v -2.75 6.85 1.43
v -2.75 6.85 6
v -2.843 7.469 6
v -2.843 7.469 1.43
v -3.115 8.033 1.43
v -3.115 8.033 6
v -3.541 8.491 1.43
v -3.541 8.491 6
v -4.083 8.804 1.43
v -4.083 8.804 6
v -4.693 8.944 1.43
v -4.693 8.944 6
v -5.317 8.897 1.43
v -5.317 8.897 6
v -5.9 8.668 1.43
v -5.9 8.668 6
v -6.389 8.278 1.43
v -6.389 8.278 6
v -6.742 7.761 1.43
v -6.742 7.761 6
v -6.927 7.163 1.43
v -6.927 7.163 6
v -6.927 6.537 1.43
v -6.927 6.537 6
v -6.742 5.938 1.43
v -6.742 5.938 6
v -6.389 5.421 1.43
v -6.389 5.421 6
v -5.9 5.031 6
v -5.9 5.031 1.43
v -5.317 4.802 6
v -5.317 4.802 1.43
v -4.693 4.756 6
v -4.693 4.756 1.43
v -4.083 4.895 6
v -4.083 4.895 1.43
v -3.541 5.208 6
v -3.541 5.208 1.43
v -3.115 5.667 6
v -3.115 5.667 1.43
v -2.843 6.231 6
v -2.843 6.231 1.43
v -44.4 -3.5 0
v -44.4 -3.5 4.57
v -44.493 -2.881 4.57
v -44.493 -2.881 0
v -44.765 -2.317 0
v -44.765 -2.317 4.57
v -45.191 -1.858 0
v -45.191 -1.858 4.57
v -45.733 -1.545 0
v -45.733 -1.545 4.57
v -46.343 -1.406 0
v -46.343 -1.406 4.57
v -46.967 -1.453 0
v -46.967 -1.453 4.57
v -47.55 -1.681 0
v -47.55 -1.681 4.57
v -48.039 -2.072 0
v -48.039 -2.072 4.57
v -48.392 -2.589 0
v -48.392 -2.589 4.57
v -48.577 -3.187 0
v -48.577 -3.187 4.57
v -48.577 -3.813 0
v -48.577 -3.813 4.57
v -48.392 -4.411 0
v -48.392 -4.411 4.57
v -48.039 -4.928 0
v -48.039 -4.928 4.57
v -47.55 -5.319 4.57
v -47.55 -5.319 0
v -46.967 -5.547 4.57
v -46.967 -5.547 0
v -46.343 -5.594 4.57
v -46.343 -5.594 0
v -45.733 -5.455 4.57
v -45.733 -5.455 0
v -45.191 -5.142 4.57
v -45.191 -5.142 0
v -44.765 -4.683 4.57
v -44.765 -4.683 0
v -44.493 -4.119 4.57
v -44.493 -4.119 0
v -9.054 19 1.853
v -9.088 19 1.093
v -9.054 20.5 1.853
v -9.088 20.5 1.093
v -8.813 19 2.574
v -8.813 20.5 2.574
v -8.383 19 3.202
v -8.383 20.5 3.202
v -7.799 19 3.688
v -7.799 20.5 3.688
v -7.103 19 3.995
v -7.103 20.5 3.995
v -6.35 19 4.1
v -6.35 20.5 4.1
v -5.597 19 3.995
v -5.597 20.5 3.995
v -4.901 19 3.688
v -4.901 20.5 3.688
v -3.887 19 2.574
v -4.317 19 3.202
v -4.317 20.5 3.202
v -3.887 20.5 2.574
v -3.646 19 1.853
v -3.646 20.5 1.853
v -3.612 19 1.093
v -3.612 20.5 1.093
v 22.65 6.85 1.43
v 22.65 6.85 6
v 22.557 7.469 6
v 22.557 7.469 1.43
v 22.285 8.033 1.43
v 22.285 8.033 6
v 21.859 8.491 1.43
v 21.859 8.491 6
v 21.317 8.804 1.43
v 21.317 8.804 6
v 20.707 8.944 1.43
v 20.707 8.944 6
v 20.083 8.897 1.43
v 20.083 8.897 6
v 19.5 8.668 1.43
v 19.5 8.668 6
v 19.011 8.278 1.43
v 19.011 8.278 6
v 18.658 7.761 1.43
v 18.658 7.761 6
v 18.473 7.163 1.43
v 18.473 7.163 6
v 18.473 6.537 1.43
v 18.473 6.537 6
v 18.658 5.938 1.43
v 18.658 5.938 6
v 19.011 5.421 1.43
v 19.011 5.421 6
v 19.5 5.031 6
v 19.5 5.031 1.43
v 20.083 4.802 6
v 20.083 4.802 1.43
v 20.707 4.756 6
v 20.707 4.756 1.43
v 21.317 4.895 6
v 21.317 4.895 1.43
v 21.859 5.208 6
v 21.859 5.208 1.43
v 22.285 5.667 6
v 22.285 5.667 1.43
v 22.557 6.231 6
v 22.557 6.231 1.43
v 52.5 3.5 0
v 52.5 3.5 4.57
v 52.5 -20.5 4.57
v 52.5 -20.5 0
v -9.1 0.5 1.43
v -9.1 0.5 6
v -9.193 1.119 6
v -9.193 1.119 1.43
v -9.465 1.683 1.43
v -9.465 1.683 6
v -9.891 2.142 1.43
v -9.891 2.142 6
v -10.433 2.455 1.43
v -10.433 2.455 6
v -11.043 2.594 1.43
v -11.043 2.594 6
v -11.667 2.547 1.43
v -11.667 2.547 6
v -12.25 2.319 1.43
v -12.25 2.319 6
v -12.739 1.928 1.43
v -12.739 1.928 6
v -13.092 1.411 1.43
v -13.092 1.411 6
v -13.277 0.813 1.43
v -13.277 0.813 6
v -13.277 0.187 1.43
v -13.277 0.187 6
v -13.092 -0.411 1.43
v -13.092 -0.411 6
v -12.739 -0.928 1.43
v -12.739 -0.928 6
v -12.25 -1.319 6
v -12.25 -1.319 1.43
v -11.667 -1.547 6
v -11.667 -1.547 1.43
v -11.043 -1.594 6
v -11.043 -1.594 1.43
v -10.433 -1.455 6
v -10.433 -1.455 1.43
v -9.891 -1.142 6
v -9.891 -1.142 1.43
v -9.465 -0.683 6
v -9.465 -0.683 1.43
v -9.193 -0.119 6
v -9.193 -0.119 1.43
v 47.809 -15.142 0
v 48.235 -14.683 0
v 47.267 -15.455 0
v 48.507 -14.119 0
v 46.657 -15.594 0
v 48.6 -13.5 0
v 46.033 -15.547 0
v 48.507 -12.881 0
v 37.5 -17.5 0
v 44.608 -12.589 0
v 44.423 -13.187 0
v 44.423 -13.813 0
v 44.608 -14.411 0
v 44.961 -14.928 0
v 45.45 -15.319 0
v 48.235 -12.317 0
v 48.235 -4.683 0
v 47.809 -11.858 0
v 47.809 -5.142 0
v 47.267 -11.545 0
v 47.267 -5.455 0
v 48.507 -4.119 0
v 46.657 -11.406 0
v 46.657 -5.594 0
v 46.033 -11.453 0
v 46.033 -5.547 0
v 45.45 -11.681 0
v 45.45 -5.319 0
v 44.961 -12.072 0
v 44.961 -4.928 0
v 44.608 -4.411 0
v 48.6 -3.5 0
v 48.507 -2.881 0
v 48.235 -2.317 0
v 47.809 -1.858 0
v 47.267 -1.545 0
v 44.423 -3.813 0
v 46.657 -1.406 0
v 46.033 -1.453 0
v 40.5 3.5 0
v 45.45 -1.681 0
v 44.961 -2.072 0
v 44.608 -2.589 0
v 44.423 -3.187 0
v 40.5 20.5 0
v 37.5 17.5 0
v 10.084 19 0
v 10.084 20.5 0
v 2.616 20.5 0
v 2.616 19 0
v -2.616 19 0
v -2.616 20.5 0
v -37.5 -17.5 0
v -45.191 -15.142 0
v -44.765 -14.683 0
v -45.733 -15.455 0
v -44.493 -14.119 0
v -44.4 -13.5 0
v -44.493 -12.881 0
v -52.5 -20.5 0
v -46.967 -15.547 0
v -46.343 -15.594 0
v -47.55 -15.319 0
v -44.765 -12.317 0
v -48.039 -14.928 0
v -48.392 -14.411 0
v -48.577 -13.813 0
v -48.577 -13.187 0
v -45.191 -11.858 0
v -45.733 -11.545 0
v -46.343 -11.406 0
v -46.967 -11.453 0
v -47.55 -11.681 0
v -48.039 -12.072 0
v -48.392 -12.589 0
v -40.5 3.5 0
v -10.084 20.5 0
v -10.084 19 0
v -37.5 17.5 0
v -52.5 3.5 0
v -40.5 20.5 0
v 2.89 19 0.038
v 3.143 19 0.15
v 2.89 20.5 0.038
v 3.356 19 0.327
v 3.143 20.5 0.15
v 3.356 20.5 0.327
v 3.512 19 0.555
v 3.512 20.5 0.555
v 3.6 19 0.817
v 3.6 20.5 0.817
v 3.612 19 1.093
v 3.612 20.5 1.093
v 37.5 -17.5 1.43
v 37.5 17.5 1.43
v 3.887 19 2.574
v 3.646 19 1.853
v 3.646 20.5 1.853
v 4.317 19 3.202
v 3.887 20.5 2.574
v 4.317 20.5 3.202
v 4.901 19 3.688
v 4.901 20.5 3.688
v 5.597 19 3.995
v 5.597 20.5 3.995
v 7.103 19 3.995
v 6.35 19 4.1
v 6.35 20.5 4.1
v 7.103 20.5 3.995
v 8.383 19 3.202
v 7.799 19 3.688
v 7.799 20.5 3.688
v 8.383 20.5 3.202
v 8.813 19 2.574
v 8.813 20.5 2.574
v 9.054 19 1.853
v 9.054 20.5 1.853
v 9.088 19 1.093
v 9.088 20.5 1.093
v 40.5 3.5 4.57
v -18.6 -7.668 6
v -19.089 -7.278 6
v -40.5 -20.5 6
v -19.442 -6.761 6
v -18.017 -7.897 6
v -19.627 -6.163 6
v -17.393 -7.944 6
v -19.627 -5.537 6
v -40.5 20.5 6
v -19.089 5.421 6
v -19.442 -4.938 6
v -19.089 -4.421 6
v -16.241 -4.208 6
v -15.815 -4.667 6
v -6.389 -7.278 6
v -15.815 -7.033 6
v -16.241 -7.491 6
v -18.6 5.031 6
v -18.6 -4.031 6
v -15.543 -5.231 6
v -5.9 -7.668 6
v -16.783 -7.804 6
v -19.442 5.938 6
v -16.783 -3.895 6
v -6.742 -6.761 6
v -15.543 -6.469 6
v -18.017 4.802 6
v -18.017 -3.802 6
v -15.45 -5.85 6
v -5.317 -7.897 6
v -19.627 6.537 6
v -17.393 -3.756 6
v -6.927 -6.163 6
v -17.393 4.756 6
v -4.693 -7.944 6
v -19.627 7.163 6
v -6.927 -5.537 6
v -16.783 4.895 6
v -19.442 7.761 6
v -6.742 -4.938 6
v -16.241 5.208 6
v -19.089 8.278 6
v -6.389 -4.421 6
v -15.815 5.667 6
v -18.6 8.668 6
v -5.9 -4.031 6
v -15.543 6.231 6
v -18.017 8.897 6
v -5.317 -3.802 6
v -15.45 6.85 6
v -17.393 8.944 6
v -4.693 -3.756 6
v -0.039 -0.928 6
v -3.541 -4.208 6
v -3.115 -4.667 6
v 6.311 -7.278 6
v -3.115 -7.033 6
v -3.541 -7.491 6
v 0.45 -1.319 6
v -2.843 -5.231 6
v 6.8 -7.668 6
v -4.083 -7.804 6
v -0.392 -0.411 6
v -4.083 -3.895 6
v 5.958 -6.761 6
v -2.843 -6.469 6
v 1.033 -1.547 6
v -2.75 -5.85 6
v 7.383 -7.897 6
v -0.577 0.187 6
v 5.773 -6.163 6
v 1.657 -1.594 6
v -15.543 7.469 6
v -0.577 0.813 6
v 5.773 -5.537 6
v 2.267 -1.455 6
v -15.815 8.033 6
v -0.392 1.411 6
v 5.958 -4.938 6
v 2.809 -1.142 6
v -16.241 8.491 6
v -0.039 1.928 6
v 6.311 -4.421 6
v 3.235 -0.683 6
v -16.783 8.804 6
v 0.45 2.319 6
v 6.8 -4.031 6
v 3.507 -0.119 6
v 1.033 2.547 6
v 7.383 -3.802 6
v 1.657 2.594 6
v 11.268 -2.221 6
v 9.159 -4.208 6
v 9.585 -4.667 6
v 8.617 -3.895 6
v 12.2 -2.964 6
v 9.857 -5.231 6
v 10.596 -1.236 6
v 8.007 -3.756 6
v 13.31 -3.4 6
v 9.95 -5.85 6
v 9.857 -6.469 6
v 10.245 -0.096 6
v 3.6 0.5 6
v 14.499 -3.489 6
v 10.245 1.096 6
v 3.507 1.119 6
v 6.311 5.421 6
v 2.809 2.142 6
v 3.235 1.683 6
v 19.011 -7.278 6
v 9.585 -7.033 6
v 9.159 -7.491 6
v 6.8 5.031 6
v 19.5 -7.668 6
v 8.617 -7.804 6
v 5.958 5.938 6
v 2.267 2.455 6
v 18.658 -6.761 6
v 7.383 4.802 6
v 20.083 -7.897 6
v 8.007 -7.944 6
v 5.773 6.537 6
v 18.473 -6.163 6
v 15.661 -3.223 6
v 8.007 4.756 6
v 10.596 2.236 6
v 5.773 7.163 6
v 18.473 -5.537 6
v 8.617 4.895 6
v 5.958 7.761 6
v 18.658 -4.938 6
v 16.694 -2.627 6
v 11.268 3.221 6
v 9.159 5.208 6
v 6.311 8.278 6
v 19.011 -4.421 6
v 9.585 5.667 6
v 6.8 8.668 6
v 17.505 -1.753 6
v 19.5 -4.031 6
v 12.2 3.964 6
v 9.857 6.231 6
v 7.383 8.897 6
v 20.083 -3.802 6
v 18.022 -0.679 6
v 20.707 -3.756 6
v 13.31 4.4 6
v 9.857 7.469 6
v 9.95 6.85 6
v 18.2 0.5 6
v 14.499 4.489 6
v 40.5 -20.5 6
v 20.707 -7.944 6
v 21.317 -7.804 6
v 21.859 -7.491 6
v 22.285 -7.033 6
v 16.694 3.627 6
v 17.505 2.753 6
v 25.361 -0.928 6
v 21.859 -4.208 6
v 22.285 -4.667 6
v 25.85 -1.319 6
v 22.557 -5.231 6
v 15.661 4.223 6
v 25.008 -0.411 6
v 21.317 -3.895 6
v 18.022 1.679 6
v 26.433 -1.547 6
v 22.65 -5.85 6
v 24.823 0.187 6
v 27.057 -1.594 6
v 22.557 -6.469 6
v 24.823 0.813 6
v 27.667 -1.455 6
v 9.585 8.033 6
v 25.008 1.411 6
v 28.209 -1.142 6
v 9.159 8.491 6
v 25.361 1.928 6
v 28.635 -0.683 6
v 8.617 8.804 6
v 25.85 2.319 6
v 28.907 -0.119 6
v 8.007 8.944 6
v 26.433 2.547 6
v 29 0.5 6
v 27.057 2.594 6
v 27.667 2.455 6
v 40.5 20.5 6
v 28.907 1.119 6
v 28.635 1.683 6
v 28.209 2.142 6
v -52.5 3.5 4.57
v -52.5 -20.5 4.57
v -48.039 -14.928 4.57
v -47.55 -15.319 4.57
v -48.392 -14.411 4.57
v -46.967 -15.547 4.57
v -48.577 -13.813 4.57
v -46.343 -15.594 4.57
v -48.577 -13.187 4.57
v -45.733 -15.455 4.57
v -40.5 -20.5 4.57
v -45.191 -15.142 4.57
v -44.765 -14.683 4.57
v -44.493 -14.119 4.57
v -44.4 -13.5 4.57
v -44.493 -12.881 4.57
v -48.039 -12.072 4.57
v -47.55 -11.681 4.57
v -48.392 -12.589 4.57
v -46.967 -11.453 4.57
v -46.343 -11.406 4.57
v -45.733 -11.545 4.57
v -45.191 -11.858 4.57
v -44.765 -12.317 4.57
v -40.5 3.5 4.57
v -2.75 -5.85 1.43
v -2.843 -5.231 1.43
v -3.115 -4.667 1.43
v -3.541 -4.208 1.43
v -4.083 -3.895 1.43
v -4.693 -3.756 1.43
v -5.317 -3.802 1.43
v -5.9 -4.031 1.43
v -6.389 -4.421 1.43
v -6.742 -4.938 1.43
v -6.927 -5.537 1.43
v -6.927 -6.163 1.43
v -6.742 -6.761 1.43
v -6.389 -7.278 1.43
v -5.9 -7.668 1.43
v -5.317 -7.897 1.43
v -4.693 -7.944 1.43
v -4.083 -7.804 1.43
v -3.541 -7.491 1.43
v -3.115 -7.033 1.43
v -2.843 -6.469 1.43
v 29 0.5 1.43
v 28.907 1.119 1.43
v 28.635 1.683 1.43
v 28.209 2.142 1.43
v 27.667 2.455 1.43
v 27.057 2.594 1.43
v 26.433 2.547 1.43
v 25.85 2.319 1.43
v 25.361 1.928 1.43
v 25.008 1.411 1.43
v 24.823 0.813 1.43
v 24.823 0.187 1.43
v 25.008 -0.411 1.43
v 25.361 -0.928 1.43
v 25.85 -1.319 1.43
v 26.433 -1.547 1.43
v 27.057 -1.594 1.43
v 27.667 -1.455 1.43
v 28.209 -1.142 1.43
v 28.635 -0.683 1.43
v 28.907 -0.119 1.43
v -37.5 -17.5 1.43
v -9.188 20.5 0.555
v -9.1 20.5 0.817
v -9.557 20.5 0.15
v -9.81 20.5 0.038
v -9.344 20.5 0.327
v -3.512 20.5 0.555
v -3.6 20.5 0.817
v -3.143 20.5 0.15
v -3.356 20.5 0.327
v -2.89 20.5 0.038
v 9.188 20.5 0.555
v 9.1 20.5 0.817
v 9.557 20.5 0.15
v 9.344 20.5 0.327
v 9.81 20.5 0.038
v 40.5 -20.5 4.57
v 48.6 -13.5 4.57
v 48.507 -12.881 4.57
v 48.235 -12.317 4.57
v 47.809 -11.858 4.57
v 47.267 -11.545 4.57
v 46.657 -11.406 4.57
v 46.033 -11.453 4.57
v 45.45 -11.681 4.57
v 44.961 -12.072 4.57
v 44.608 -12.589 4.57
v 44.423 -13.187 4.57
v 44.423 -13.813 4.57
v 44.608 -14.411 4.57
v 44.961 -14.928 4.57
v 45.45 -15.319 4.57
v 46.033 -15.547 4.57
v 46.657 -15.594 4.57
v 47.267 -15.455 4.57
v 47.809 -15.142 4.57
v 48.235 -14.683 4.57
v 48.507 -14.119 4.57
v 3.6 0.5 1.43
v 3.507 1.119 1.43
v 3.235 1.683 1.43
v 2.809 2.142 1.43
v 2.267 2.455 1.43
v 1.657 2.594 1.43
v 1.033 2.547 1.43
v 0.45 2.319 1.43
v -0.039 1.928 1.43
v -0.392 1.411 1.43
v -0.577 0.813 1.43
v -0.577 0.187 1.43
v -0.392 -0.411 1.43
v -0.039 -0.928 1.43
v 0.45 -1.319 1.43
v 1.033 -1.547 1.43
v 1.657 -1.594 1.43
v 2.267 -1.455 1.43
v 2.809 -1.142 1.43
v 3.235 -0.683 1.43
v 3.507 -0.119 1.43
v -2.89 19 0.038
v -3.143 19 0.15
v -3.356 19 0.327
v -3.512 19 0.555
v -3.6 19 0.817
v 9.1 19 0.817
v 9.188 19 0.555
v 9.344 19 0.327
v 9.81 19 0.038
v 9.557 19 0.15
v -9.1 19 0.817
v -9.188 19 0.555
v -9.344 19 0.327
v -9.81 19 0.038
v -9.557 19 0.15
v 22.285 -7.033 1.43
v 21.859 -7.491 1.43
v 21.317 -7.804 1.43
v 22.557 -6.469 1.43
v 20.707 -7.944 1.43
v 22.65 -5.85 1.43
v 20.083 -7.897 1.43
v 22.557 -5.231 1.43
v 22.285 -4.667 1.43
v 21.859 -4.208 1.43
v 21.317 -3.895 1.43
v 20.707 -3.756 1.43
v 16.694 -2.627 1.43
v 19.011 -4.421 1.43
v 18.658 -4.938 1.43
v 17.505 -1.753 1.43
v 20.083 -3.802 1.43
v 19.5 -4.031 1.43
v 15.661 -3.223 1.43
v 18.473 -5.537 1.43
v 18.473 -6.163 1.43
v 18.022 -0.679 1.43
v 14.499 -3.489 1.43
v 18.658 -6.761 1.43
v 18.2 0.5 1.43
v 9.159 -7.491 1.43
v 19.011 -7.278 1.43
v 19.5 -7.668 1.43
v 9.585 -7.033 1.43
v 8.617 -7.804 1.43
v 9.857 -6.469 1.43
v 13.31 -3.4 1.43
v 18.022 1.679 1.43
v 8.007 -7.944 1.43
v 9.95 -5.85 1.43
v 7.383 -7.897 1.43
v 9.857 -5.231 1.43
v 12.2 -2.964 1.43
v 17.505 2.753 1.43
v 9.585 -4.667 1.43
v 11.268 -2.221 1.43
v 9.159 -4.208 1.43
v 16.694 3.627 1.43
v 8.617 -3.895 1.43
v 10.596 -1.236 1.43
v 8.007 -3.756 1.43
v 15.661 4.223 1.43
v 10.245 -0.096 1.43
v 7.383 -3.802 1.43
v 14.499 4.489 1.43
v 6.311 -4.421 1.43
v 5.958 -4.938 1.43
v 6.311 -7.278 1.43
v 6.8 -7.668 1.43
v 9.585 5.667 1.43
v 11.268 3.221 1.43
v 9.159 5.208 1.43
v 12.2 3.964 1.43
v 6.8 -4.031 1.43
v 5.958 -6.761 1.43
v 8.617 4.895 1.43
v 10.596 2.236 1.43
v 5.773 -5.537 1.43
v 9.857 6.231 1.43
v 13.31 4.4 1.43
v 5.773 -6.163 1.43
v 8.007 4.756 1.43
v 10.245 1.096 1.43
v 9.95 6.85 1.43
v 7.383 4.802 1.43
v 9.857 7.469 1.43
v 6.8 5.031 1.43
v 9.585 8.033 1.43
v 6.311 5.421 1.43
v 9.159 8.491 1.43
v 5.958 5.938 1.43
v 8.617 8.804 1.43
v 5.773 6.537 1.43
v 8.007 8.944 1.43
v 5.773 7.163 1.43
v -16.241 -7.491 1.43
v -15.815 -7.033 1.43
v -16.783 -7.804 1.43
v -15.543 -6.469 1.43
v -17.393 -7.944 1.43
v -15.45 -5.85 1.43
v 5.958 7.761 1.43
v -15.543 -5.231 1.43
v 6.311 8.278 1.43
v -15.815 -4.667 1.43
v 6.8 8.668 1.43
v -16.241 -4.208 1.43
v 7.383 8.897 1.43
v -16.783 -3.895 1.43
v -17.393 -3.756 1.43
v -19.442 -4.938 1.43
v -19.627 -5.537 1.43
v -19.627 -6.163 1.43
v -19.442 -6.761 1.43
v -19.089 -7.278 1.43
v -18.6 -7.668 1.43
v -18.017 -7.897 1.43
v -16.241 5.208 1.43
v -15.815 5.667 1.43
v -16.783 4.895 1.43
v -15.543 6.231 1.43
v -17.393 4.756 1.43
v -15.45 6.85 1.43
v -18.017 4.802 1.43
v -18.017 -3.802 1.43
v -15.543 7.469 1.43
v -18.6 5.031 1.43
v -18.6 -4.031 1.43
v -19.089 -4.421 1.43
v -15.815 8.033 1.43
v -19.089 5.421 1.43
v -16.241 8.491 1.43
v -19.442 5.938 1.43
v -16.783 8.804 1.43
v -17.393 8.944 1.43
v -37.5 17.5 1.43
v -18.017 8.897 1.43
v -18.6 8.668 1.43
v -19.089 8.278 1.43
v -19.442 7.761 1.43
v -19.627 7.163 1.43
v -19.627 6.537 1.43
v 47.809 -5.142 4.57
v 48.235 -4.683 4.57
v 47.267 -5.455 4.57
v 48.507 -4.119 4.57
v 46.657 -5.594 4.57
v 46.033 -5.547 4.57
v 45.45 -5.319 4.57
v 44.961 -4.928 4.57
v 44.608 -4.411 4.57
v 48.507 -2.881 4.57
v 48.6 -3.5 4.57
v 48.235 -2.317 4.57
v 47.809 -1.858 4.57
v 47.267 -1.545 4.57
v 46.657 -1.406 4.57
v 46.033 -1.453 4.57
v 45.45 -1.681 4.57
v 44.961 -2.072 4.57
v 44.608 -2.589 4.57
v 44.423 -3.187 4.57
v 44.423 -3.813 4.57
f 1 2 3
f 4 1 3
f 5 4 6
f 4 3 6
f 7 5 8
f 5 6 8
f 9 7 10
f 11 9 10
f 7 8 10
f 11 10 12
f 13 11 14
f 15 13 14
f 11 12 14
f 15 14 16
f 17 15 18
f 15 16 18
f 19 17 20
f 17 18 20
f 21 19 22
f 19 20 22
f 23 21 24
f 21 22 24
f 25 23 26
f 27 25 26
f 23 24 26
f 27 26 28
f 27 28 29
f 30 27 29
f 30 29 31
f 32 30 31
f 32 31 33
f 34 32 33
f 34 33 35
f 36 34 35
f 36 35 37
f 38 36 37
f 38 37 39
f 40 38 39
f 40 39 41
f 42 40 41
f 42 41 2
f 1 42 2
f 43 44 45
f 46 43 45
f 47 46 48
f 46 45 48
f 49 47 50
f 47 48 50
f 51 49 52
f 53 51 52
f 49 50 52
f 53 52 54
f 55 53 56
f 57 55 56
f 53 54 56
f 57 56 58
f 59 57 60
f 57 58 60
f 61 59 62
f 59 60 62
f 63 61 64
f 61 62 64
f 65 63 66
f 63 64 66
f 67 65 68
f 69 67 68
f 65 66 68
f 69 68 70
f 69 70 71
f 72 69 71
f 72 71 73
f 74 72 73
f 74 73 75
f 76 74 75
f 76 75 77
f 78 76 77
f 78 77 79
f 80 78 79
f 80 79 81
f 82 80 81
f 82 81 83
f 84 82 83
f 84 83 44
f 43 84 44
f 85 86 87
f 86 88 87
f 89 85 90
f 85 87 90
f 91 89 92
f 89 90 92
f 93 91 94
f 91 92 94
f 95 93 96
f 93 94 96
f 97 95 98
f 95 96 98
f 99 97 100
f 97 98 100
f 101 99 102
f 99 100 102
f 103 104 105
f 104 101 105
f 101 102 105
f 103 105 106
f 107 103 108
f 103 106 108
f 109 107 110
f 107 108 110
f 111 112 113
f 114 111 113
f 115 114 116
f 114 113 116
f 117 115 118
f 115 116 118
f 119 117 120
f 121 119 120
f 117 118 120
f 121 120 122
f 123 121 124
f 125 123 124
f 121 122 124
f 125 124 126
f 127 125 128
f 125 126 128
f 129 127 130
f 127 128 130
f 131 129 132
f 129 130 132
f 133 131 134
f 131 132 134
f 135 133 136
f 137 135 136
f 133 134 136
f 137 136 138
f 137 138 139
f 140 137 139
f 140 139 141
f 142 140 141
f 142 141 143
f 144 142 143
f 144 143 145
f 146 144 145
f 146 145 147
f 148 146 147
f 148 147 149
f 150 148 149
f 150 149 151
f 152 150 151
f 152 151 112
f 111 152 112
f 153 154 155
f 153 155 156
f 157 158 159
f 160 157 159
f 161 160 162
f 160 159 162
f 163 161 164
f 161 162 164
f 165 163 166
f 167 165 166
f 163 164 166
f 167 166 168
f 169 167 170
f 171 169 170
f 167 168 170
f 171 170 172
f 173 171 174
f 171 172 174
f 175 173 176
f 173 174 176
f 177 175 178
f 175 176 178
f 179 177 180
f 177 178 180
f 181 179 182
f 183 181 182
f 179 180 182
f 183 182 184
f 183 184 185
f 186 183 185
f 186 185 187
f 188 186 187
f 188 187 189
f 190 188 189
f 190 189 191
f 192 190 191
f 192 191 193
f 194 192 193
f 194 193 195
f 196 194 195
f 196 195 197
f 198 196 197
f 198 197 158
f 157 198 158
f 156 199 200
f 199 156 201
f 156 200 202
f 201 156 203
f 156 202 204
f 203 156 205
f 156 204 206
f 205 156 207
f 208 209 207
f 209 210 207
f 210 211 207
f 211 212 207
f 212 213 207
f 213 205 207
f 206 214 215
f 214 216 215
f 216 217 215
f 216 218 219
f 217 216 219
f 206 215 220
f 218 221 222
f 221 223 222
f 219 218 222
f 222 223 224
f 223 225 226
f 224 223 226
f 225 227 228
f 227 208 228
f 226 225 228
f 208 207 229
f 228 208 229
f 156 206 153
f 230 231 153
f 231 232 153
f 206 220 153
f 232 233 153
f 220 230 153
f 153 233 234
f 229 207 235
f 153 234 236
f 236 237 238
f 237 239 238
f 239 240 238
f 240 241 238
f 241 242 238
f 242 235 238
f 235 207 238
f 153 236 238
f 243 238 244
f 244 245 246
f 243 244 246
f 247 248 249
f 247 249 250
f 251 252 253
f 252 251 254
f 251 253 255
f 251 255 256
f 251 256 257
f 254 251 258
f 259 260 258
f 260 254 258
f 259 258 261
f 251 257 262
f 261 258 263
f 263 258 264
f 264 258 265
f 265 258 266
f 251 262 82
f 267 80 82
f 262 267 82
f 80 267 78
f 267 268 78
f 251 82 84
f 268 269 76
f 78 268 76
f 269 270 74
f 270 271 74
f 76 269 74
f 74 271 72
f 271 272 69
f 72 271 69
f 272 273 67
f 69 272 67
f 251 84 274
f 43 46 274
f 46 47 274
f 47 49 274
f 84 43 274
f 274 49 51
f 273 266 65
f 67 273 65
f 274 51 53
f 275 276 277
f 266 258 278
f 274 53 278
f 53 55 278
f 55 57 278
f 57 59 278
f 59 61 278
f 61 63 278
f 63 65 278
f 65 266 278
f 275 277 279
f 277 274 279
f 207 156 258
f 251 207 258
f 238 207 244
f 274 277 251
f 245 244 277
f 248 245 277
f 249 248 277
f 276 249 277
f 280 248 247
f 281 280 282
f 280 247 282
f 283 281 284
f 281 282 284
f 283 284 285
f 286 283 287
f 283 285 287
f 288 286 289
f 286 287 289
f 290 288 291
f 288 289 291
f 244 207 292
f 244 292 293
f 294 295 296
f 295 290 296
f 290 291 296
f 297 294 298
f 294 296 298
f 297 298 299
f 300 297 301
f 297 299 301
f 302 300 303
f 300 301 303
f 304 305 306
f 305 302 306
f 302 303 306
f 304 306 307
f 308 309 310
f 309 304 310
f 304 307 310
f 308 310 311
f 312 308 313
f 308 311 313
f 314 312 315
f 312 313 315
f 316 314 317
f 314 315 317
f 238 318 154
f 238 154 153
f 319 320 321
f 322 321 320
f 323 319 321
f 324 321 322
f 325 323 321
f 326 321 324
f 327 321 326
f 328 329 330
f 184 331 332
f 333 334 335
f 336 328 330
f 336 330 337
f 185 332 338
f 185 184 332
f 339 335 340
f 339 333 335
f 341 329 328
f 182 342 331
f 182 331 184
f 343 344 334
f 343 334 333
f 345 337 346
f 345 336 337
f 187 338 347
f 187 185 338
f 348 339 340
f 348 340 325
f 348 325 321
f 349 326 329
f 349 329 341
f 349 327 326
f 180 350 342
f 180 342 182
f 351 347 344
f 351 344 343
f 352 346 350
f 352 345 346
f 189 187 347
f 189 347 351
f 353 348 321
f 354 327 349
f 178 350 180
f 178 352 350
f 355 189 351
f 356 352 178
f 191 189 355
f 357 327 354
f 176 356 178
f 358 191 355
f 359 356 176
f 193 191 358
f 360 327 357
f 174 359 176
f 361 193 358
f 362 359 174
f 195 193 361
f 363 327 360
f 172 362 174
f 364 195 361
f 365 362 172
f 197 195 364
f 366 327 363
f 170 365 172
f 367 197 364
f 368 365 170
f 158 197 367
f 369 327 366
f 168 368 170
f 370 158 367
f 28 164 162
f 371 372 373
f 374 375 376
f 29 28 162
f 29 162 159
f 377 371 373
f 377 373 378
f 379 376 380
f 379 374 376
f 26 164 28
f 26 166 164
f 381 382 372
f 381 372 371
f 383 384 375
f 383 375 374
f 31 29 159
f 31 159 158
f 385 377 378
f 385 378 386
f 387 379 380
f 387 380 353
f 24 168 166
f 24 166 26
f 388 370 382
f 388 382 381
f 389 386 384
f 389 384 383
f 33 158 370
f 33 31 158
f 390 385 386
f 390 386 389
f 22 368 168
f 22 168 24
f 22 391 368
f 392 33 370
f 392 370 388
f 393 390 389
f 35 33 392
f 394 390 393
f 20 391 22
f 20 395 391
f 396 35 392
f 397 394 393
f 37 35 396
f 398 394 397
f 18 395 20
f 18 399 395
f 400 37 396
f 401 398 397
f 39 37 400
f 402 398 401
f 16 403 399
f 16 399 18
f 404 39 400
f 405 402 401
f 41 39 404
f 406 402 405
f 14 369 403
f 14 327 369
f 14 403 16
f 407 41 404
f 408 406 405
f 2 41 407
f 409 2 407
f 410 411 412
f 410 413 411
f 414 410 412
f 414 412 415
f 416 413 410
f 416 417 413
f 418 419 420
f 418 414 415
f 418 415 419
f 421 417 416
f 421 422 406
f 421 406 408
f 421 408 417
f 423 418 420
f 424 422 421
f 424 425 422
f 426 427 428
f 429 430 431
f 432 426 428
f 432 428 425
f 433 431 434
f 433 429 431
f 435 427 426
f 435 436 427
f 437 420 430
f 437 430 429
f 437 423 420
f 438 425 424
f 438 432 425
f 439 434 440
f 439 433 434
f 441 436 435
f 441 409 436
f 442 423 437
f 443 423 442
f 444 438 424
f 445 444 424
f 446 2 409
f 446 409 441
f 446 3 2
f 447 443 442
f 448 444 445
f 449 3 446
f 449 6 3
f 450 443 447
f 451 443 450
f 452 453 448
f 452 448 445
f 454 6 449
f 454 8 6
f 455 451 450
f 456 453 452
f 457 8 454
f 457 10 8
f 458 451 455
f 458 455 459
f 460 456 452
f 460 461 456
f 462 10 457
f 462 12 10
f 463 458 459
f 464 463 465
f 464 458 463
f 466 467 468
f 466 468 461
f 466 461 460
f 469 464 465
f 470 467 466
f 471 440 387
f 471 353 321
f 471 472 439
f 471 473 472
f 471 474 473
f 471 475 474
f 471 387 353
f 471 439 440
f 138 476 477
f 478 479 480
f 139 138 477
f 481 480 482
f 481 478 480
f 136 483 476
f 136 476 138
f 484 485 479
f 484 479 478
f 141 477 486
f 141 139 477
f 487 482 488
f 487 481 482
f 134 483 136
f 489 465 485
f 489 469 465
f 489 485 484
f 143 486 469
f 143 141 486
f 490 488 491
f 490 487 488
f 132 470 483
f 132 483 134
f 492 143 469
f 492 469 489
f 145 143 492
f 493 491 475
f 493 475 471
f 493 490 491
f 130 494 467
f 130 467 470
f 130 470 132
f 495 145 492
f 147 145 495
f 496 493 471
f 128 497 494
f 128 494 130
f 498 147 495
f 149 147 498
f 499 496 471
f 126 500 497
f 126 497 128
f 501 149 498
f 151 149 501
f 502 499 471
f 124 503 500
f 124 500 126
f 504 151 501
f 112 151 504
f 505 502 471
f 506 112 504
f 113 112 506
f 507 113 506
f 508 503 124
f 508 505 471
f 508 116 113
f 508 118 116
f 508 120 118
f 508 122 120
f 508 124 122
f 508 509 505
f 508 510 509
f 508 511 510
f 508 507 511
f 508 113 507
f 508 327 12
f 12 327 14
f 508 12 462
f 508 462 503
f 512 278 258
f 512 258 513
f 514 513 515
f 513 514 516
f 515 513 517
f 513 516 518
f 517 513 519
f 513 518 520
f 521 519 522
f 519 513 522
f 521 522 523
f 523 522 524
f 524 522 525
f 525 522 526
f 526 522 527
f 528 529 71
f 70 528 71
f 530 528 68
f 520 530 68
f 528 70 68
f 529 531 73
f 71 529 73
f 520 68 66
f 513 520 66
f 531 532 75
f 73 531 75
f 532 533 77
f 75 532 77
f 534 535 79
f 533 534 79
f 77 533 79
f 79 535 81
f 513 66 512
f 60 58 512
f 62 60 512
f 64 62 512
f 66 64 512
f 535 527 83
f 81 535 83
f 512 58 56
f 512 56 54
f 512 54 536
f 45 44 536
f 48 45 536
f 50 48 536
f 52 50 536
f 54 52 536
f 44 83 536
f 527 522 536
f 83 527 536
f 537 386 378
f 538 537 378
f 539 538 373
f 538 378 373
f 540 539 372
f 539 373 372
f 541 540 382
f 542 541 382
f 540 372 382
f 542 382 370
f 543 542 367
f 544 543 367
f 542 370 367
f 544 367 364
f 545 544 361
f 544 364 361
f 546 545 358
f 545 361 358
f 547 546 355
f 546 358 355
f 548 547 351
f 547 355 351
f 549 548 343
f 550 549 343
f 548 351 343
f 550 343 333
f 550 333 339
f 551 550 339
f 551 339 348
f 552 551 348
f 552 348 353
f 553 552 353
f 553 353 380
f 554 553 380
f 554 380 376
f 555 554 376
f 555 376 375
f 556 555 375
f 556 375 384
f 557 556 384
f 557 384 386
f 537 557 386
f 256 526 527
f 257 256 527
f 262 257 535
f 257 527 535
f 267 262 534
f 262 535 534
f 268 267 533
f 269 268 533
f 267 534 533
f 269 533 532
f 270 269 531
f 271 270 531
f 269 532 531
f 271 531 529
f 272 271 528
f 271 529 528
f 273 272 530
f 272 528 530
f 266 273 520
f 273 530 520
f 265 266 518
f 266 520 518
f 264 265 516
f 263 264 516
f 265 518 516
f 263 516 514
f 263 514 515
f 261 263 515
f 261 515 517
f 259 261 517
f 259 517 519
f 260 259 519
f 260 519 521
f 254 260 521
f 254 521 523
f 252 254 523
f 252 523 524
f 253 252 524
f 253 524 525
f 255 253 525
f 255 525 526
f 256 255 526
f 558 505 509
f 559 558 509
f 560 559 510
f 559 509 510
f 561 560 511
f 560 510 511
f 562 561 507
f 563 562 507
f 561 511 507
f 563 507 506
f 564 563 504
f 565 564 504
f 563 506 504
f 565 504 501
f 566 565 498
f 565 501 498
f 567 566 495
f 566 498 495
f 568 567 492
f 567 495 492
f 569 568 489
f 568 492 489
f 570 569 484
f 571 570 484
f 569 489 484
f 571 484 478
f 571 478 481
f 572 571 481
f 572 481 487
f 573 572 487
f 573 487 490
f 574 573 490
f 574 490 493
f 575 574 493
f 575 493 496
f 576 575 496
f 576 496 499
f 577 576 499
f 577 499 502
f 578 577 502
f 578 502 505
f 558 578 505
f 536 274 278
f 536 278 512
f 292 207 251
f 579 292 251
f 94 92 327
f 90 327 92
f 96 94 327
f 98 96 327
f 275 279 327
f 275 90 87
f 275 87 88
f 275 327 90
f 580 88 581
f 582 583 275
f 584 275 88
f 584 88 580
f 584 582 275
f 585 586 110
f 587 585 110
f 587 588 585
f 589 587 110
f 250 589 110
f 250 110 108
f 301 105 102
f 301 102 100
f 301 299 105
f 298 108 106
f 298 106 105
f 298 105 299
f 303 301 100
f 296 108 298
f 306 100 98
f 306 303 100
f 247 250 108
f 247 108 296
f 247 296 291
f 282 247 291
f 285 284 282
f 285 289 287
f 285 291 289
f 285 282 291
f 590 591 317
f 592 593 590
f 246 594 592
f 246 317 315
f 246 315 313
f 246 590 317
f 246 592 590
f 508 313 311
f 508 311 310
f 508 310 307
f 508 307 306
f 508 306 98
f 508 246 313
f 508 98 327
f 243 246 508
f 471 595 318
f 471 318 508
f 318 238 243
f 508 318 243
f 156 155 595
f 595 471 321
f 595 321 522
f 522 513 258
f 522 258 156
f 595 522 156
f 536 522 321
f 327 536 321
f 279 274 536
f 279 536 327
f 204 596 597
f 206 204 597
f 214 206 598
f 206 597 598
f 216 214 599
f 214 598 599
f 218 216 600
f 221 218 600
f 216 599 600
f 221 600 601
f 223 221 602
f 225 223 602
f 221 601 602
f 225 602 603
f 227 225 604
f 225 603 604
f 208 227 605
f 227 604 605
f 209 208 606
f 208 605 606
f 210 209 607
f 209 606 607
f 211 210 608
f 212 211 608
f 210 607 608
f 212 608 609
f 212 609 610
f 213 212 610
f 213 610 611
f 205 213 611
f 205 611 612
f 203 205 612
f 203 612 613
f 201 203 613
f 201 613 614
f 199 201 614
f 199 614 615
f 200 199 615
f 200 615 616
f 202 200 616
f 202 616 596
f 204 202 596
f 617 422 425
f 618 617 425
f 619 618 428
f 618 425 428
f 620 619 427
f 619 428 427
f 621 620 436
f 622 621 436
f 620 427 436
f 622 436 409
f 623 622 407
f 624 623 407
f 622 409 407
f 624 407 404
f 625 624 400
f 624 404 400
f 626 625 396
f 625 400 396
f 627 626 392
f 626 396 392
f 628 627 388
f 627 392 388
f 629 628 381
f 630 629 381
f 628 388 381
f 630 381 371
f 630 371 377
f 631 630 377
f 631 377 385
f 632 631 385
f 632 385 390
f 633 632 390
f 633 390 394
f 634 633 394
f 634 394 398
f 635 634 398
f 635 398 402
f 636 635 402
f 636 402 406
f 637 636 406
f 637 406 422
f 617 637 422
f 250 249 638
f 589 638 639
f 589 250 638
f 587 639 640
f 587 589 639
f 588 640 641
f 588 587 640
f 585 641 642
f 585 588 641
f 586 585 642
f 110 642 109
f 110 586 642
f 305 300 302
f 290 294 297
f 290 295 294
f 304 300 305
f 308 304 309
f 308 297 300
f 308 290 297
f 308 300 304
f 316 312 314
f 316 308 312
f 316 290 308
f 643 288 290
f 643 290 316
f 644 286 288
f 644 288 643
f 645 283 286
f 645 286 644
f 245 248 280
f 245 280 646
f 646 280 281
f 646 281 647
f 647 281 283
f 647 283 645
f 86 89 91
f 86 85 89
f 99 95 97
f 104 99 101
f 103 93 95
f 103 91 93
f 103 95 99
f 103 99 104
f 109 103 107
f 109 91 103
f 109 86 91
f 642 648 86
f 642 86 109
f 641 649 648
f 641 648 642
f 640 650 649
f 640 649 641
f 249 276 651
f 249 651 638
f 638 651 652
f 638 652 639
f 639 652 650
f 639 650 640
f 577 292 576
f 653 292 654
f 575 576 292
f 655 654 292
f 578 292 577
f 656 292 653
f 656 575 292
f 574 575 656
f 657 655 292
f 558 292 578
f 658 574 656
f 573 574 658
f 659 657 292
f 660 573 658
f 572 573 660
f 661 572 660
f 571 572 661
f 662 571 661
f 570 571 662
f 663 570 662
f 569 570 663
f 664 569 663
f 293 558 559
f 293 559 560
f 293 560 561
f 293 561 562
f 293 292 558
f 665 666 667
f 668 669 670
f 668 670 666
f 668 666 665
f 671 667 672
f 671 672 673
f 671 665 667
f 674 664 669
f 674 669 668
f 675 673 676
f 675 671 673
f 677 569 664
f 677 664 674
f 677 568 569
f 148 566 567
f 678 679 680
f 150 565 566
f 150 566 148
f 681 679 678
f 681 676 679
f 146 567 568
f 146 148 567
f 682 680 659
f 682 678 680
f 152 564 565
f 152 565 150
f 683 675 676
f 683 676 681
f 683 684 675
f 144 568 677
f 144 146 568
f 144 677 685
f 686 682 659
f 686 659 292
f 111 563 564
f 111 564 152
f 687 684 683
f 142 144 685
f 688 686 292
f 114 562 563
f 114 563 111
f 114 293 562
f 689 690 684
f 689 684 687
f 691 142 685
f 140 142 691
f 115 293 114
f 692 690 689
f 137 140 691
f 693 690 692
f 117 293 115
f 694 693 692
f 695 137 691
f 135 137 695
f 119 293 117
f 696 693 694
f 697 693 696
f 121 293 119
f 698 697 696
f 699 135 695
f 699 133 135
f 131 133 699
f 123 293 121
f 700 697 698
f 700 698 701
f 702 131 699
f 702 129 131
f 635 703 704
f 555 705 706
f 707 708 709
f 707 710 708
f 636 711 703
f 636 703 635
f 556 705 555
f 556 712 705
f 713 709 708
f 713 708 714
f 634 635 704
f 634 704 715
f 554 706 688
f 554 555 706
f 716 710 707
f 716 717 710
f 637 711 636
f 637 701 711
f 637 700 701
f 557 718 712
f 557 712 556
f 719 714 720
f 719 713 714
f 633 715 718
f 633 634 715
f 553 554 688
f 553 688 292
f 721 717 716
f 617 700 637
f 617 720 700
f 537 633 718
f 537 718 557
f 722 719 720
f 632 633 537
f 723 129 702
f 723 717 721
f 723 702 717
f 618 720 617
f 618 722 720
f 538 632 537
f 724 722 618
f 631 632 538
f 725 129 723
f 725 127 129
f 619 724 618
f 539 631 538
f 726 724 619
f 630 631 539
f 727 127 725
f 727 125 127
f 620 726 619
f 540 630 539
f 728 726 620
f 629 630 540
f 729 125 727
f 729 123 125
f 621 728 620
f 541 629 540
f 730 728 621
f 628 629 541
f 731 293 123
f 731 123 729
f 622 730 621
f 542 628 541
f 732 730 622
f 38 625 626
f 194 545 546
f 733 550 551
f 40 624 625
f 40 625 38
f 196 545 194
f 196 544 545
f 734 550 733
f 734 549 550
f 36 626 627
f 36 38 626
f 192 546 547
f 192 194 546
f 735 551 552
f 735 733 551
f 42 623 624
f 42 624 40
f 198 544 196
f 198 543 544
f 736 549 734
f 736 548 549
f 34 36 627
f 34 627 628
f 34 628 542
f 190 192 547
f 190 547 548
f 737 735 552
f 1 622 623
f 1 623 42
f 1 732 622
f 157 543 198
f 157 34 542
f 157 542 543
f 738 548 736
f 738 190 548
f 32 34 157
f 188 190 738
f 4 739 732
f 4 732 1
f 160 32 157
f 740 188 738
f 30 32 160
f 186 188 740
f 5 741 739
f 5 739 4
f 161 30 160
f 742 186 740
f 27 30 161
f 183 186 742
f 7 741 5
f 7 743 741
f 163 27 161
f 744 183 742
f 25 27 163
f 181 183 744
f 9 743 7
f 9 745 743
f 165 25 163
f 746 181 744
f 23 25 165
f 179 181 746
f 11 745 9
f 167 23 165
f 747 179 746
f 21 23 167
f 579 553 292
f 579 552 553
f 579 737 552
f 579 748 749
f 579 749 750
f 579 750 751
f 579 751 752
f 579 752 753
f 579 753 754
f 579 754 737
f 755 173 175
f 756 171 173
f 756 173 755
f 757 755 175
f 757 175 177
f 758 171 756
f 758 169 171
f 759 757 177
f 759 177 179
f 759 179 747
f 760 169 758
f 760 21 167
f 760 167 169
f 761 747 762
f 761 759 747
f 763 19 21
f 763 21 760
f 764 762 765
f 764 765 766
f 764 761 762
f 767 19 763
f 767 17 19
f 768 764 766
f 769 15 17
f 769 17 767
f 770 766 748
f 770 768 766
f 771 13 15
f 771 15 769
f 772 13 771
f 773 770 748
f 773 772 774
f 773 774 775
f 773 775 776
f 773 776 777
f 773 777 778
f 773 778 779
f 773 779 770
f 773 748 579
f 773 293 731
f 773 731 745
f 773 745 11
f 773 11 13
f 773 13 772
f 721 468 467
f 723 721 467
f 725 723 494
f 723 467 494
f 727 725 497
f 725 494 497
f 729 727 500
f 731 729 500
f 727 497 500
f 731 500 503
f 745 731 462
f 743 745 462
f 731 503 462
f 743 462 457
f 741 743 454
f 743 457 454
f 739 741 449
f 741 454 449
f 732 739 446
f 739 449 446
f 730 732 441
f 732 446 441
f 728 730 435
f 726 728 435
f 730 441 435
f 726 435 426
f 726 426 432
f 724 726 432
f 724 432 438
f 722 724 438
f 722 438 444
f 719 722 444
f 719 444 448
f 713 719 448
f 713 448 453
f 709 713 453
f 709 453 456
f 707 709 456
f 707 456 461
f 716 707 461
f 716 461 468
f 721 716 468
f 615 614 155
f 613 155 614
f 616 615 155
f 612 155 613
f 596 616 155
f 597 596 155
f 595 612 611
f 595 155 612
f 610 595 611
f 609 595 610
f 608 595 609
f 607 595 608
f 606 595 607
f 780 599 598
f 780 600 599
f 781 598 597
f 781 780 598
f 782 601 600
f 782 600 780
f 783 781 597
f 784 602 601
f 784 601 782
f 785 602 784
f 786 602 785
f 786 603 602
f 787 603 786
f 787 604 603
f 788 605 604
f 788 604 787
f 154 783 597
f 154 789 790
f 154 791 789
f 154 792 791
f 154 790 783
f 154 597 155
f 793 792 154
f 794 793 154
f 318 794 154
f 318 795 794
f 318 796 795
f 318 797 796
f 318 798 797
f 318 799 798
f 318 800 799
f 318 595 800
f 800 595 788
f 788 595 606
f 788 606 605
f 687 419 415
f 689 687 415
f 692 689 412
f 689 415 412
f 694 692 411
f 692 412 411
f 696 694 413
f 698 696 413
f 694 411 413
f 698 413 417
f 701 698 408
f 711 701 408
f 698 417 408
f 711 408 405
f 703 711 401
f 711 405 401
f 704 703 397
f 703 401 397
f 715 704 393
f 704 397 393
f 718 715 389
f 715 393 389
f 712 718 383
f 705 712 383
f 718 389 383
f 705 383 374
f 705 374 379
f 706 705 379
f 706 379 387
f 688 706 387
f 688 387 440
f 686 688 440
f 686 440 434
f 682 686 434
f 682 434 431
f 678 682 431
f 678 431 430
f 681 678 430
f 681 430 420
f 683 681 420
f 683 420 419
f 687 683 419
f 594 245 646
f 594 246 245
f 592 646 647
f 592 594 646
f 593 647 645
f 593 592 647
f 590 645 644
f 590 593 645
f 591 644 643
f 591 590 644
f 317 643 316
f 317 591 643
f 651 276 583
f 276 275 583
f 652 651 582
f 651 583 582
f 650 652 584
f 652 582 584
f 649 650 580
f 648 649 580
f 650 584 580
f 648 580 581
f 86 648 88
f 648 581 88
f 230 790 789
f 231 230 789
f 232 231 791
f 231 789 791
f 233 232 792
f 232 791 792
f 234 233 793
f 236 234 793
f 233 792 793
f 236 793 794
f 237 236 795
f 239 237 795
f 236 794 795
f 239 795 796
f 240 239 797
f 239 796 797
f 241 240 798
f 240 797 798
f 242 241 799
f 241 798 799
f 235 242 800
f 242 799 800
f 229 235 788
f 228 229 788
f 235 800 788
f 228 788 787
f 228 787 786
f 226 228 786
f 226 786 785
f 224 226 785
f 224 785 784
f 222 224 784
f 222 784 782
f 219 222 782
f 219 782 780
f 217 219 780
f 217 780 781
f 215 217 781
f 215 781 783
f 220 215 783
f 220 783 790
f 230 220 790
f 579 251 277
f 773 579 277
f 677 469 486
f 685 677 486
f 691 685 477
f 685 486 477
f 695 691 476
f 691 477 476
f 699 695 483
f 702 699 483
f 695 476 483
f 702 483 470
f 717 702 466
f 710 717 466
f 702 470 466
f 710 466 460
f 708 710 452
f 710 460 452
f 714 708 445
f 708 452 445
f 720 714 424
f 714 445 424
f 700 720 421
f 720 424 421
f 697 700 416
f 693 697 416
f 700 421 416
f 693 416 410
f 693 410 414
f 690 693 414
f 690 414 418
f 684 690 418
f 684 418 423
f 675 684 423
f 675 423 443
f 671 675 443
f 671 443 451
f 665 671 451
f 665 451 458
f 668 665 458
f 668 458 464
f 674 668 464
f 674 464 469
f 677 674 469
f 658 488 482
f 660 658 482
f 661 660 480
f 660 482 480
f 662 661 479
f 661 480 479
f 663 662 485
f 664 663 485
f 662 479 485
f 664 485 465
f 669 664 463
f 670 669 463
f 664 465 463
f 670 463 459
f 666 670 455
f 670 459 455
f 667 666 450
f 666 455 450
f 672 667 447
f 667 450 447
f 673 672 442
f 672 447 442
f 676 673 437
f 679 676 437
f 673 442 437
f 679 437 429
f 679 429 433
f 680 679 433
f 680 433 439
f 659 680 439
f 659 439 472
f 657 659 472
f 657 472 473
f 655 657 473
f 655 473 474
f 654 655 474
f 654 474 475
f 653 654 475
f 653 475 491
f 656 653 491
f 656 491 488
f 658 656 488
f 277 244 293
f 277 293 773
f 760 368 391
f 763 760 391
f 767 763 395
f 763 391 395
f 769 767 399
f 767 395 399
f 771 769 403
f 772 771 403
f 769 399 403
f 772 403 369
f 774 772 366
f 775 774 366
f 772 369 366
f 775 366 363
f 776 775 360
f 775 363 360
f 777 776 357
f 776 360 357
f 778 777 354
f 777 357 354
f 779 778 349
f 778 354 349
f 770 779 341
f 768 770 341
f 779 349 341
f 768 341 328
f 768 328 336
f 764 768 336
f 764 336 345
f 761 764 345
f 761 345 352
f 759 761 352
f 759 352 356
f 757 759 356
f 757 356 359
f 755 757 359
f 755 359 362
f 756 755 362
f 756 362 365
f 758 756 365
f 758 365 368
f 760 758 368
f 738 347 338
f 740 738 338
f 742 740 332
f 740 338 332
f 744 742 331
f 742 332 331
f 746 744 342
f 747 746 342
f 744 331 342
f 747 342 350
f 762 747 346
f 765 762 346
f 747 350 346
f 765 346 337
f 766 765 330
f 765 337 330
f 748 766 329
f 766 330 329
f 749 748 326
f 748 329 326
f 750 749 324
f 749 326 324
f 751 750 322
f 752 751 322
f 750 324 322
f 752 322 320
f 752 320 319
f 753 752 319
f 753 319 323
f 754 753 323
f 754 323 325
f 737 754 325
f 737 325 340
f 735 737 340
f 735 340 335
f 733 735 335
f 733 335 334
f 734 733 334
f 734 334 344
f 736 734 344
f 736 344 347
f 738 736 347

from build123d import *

# Parameters (mm, degrees)
SKETCH1_W           = 81
SKETCH1_H           = 41
BOSS_EXTRUDE1_DEPTH = 6
SKETCH5_W           = 75
SKETCH5_H           = 35
CUT_EXTRUDE1_DEPTH  = 1.43
SKETCH8_R           = 2.1
SKETCH8_R_2         = 4
CUT_EXTRUDE2_DEPTH  = 7
SKETCH9_R           = 2.75
CUT_EXTRUDE3_DEPTH  = 1.5
FILLET1_R           = 1
SKETCH10_W          = 4.57
SKETCH10_H          = 24
BOSS_EXTRUDE2_DEPTH = 12
SKETCH12_W          = 4.57
SKETCH12_H          = 24
BOSS_EXTRUDE3_DEPTH = 12
SKETCH13_R          = 2.1
CUT_EXTRUDE4_DEPTH  = 5.57


with BuildPart() as part:
    # Sketch1 → Boss-Extrude1 (new body)
    with BuildSketch(Plane.XY):
        Rectangle(SKETCH1_W, SKETCH1_H)
    extrude(amount=BOSS_EXTRUDE1_DEPTH)

    # Sketch5 → Cut-Extrude1 (cut)
    with BuildSketch(Plane(origin=(0, 0, 0), x_dir=(-1, 0, 0), z_dir=(0, 0, -1))):
        Rectangle(SKETCH5_W, SKETCH5_H)
    extrude(amount=-CUT_EXTRUDE1_DEPTH, mode=Mode.SUBTRACT)

    # Sketch8 → Cut-Extrude2 (cut, through all)
    with BuildSketch(Plane.XY.offset(6)):
        with Locations((26.9, 0.5)):
            Circle(SKETCH8_R)
        with Locations((20.55, 6.849637785)):
            Circle(SKETCH8_R)
        with Locations((7.85, 6.849637785)):
            Circle(SKETCH8_R)
        with Locations((7.85, -5.849637785)):
            Circle(SKETCH8_R)
        with Locations((20.55, -5.849637785)):
            Circle(SKETCH8_R)
        with Locations((1.5, 0.5)):
            Circle(SKETCH8_R)
        with Locations((-4.85, 6.849637785)):
            Circle(SKETCH8_R)
        with Locations((-4.85, -5.849637785)):
            Circle(SKETCH8_R)
        with Locations((-11.2, 0.5)):
            Circle(SKETCH8_R)
        with Locations((-17.55, 6.849637785)):
            Circle(SKETCH8_R)
        with Locations((-17.55, -5.849637785)):
            Circle(SKETCH8_R)
        with Locations((14.2, 0.5)):
            Circle(SKETCH8_R_2)
    extrude(amount=-CUT_EXTRUDE2_DEPTH, mode=Mode.SUBTRACT)

    # Sketch9 → Cut-Extrude3 (cut)
    with BuildSketch(Plane(origin=(0, 20.5, 0), x_dir=(1, 0, 0), z_dir=(0, 1, 0))):
        with Locations((6.35, -1.35)):
            Circle(SKETCH9_R)
        with Locations((-6.35, -1.35)):
            Circle(SKETCH9_R)
    extrude(amount=-CUT_EXTRUDE3_DEPTH, mode=Mode.SUBTRACT)

    # Fillet1
    fillet1_edges = [part.edges().sort_by_distance(p)[0] for p in [
        (-8.74582971, 19.75, 0),
        (-3.95417029, 19.75, 0),
        (3.95417029, 19.75, 0),
        (8.74582971, 19.75, 0),
    ]]
    fillet(fillet1_edges, radius=FILLET1_R)

    # Sketch10 → Boss-Extrude2 (add)
    with BuildSketch(Plane.ZY.offset(40.5)):
        with Locations((2.285, -8.5)):
            Rectangle(SKETCH10_W, SKETCH10_H)
    extrude(amount=BOSS_EXTRUDE2_DEPTH)

    # Sketch12 → Boss-Extrude3 (add)
    with BuildSketch(Plane(origin=(40.5, 0, 0), x_dir=(0, 0, -1), z_dir=(1, 0, 0))):
        with Locations((-2.285, -8.5)):
            Rectangle(SKETCH12_W, SKETCH12_H)
    extrude(amount=BOSS_EXTRUDE3_DEPTH)

    # Sketch13 → Cut-Extrude4 (cut, through all)
    with BuildSketch(Plane.XY.offset(4.57)):
        with Locations((-46.5, -3.5)):
            Circle(SKETCH13_R)
        with Locations((-46.5, -13.5)):
            Circle(SKETCH13_R)
        with Locations((46.5, -3.5)):
            Circle(SKETCH13_R)
        with Locations((46.5, -13.5)):
            Circle(SKETCH13_R)
    extrude(amount=-CUT_EXTRUDE4_DEPTH, mode=Mode.SUBTRACT)


solid = part.part
